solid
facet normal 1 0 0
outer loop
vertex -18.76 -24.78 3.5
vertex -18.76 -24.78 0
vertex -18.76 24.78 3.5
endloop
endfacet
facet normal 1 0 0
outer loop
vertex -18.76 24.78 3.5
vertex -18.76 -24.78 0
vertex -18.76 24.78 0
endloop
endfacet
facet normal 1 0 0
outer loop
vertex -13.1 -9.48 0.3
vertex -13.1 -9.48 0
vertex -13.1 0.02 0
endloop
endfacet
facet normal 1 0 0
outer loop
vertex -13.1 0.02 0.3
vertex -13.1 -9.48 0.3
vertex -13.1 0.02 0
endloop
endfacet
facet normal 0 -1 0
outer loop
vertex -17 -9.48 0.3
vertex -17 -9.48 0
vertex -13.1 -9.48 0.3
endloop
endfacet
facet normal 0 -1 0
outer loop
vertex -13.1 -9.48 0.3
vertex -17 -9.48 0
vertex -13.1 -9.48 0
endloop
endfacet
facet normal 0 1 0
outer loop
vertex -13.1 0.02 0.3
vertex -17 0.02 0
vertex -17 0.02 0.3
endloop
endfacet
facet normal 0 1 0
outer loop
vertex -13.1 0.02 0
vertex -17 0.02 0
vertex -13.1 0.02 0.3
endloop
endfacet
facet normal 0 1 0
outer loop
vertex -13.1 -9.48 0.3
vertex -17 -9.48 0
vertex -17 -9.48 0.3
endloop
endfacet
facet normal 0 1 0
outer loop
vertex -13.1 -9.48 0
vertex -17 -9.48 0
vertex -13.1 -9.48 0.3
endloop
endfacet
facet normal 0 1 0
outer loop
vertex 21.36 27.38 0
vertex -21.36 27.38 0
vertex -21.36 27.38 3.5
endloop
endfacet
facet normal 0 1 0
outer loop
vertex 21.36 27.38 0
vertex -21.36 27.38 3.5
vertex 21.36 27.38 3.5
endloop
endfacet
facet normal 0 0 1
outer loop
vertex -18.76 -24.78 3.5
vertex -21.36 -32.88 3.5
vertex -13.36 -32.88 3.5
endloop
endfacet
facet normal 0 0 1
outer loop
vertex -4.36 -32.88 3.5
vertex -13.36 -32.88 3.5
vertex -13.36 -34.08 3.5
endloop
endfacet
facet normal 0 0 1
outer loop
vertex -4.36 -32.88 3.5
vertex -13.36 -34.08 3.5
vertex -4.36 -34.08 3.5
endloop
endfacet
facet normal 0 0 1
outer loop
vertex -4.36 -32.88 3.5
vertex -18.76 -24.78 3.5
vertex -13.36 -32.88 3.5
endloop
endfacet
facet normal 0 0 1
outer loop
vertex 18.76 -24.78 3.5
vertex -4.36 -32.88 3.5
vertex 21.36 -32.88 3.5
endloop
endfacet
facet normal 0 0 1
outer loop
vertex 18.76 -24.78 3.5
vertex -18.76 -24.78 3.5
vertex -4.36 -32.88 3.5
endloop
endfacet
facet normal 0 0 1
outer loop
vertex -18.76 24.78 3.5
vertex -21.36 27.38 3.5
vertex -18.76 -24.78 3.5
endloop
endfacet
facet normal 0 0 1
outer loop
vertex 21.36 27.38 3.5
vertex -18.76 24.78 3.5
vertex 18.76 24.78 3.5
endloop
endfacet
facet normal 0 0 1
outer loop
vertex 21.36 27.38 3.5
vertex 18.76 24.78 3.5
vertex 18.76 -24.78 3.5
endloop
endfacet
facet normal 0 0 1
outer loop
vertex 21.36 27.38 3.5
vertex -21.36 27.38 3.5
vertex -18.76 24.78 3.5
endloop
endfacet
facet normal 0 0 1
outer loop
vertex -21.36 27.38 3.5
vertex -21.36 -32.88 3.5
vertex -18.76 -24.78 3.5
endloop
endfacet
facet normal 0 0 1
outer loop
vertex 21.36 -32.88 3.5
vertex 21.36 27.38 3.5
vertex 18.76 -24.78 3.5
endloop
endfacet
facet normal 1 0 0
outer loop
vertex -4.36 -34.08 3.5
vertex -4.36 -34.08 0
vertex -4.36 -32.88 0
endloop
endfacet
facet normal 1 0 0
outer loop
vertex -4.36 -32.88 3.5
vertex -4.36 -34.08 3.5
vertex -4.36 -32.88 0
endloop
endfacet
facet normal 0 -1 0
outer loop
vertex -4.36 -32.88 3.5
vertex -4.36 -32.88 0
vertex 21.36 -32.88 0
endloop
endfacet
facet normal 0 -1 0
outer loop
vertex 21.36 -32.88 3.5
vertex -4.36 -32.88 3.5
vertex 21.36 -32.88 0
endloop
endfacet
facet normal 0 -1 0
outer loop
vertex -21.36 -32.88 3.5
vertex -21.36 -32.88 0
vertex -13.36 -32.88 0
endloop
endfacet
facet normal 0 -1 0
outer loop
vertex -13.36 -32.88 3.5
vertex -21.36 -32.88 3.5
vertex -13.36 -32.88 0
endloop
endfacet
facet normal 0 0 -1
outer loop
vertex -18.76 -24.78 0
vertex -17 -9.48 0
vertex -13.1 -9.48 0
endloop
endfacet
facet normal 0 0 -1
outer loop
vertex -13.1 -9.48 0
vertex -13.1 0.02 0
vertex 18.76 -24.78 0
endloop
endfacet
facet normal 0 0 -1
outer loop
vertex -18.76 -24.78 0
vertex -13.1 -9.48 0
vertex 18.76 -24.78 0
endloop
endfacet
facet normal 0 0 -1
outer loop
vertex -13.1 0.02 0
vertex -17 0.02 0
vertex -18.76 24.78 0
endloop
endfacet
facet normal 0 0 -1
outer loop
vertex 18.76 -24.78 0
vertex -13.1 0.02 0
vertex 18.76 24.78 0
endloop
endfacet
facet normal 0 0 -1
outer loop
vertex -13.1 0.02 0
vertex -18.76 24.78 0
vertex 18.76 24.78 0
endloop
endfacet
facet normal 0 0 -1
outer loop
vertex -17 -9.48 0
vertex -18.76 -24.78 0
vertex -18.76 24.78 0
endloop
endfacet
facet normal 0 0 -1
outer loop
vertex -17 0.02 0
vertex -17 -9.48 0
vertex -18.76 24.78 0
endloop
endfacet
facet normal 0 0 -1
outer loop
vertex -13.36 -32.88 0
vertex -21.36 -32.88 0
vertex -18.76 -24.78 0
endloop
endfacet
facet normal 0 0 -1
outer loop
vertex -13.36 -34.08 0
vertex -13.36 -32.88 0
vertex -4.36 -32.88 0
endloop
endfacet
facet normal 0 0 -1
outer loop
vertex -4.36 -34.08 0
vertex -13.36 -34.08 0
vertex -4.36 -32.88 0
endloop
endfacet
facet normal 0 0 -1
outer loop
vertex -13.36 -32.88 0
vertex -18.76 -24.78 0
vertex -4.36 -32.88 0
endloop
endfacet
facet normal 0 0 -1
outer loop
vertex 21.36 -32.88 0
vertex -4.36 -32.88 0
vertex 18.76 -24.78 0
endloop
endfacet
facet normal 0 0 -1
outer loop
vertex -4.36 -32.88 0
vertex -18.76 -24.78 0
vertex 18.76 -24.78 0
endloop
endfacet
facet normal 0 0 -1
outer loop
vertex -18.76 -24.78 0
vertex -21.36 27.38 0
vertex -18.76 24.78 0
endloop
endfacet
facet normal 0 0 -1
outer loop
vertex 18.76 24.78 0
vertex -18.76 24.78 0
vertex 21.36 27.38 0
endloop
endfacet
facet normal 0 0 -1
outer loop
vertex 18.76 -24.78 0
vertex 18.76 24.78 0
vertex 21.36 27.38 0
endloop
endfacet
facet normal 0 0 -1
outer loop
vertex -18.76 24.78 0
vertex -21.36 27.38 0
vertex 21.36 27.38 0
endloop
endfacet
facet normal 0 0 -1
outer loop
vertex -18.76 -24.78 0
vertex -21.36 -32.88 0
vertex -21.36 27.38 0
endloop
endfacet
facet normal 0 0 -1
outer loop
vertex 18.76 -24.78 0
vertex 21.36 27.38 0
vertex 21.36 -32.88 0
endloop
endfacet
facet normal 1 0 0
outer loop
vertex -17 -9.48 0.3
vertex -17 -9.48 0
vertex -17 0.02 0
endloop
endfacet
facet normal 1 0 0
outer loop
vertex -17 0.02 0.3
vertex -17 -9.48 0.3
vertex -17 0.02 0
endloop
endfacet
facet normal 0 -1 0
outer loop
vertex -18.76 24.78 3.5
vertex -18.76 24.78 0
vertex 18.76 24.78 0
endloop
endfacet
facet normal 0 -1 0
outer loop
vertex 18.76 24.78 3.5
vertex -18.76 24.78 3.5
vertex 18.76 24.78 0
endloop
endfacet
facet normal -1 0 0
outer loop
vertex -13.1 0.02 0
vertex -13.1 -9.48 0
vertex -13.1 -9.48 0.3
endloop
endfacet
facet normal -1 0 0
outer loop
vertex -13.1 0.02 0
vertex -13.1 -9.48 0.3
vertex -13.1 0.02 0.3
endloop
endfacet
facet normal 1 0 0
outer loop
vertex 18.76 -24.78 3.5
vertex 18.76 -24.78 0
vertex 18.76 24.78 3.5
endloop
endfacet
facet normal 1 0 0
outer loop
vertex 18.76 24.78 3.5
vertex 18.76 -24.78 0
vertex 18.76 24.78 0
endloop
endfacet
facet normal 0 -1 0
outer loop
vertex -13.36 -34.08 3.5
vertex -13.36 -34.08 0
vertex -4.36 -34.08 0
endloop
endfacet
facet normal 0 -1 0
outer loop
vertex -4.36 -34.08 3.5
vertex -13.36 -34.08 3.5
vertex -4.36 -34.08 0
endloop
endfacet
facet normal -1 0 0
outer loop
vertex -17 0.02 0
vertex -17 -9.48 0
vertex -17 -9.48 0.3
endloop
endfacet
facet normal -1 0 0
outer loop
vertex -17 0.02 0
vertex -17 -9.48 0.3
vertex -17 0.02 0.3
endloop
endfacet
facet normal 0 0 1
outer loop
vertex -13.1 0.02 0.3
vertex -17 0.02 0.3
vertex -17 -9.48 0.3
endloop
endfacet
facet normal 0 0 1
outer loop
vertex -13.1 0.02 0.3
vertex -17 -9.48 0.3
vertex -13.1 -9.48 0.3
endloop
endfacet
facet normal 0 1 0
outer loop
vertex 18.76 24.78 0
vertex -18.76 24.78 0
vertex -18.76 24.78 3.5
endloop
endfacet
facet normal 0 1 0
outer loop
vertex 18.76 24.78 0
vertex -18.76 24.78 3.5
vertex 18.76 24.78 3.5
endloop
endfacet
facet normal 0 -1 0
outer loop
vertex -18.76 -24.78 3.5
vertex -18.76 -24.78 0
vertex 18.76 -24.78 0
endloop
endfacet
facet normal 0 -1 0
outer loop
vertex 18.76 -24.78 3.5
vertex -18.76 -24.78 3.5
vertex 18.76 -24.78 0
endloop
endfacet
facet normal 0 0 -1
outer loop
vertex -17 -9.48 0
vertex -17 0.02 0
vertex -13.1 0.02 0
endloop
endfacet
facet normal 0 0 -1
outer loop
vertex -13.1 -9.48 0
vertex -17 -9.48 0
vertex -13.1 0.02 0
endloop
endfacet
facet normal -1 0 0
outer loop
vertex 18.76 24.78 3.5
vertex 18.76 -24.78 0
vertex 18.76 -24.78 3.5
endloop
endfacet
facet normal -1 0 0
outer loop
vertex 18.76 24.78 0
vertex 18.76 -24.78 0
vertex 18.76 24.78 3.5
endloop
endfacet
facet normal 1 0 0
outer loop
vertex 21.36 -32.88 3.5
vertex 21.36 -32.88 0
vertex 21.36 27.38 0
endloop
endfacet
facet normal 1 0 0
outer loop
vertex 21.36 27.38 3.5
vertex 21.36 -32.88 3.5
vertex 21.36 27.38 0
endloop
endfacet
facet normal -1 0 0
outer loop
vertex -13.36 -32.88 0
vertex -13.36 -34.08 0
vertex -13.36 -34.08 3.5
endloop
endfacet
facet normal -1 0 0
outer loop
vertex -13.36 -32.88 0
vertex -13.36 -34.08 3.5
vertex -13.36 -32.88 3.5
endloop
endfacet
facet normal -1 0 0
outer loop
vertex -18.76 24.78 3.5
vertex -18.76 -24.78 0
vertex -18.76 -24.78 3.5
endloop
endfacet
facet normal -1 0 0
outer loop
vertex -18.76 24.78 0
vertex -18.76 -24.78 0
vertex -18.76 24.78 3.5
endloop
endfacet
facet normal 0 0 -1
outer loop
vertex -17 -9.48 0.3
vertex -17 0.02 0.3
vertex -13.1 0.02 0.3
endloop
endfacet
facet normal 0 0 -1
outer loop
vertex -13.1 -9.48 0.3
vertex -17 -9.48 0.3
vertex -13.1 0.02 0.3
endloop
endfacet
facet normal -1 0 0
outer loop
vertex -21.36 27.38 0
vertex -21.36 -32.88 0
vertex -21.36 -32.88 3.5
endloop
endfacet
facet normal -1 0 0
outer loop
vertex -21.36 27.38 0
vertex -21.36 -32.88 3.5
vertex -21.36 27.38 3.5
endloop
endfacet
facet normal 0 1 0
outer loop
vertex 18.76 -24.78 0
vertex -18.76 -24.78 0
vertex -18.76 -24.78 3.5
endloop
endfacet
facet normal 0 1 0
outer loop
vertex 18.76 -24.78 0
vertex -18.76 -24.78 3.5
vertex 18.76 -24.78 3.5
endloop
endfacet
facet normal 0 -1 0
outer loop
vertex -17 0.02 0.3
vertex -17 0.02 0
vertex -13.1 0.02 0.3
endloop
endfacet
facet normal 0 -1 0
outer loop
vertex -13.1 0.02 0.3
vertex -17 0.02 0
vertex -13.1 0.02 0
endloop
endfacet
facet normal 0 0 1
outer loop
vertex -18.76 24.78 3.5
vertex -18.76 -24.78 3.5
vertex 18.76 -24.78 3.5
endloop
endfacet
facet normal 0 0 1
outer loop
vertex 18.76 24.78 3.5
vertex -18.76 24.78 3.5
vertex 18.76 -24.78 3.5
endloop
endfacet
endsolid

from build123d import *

# Parameters (mm, degrees)
MAIN_FEATURES_SKETCH_W   = 42.72
MAIN_FEATURES_SKETCH_H   = 60.26
MAIN_FEATURES_SKETCH_W_2 = 37.52
MAIN_FEATURES_SKETCH_H_2 = 49.56
MAIN_FEATURES_SKETCH_W_3 = 9
MAIN_FEATURES_SKETCH_H_3 = 1.2
BOSS_EXTRUDE1_DEPTH      = 3.5
SKETCH1_3_W              = 37.52
SKETCH1_3_H              = 49.56
SKETCH1_3_W_2            = 3.9
SKETCH1_3_H_2            = 9.5
BOSS_EXTRUDE2_DEPTH      = 3.5
MAIN_FEATURES_SKETCH_4_W = 3.9
MAIN_FEATURES_SKETCH_4_H = 9.5
CUT_EXTRUDE1_DEPTH       = 0.3
MAIN_FEATURES_SKETCH_5_W = 3.9
MAIN_FEATURES_SKETCH_5_H = 9.5
BOSS_EXTRUDE3_DEPTH      = 0.3


with BuildPart() as part:
    # main_features_sketch → Boss-Extrude1 (new body)
    with BuildSketch(Plane.XY):
        with Locations((0, -2.75)):
            Rectangle(MAIN_FEATURES_SKETCH_W, MAIN_FEATURES_SKETCH_H)
        Rectangle(MAIN_FEATURES_SKETCH_W_2, MAIN_FEATURES_SKETCH_H_2, mode=Mode.SUBTRACT)
        with Locations((-8.86, -33.48)):
            Rectangle(MAIN_FEATURES_SKETCH_W_3, MAIN_FEATURES_SKETCH_H_3)
    extrude(amount=BOSS_EXTRUDE1_DEPTH)


with BuildPart() as body_2:
    # Sketch1<3> → Boss-Extrude2 (new body)
    with BuildSketch(Plane.XY):
        Rectangle(SKETCH1_3_W, SKETCH1_3_H)
        with Locations((-15.05, -4.73)):
            Rectangle(SKETCH1_3_W_2, SKETCH1_3_H_2)
    extrude(amount=BOSS_EXTRUDE2_DEPTH)

    # main_features_sketch<4> → Cut-Extrude1 (cut)
    with BuildSketch(Plane.XY):
        with Locations((-15.05, -4.73)):
            Rectangle(MAIN_FEATURES_SKETCH_4_W, MAIN_FEATURES_SKETCH_4_H)
    extrude(amount=CUT_EXTRUDE1_DEPTH, mode=Mode.SUBTRACT)


with BuildPart() as body_3:
    # main_features_sketch<5> → Boss-Extrude3 (new body)
    with BuildSketch(Plane.XY):
        with Locations((-15.05, -4.73)):
            Rectangle(MAIN_FEATURES_SKETCH_5_W, MAIN_FEATURES_SKETCH_5_H)
    extrude(amount=BOSS_EXTRUDE3_DEPTH)


solid = Compound([part.part, body_2.part, body_3.part])
